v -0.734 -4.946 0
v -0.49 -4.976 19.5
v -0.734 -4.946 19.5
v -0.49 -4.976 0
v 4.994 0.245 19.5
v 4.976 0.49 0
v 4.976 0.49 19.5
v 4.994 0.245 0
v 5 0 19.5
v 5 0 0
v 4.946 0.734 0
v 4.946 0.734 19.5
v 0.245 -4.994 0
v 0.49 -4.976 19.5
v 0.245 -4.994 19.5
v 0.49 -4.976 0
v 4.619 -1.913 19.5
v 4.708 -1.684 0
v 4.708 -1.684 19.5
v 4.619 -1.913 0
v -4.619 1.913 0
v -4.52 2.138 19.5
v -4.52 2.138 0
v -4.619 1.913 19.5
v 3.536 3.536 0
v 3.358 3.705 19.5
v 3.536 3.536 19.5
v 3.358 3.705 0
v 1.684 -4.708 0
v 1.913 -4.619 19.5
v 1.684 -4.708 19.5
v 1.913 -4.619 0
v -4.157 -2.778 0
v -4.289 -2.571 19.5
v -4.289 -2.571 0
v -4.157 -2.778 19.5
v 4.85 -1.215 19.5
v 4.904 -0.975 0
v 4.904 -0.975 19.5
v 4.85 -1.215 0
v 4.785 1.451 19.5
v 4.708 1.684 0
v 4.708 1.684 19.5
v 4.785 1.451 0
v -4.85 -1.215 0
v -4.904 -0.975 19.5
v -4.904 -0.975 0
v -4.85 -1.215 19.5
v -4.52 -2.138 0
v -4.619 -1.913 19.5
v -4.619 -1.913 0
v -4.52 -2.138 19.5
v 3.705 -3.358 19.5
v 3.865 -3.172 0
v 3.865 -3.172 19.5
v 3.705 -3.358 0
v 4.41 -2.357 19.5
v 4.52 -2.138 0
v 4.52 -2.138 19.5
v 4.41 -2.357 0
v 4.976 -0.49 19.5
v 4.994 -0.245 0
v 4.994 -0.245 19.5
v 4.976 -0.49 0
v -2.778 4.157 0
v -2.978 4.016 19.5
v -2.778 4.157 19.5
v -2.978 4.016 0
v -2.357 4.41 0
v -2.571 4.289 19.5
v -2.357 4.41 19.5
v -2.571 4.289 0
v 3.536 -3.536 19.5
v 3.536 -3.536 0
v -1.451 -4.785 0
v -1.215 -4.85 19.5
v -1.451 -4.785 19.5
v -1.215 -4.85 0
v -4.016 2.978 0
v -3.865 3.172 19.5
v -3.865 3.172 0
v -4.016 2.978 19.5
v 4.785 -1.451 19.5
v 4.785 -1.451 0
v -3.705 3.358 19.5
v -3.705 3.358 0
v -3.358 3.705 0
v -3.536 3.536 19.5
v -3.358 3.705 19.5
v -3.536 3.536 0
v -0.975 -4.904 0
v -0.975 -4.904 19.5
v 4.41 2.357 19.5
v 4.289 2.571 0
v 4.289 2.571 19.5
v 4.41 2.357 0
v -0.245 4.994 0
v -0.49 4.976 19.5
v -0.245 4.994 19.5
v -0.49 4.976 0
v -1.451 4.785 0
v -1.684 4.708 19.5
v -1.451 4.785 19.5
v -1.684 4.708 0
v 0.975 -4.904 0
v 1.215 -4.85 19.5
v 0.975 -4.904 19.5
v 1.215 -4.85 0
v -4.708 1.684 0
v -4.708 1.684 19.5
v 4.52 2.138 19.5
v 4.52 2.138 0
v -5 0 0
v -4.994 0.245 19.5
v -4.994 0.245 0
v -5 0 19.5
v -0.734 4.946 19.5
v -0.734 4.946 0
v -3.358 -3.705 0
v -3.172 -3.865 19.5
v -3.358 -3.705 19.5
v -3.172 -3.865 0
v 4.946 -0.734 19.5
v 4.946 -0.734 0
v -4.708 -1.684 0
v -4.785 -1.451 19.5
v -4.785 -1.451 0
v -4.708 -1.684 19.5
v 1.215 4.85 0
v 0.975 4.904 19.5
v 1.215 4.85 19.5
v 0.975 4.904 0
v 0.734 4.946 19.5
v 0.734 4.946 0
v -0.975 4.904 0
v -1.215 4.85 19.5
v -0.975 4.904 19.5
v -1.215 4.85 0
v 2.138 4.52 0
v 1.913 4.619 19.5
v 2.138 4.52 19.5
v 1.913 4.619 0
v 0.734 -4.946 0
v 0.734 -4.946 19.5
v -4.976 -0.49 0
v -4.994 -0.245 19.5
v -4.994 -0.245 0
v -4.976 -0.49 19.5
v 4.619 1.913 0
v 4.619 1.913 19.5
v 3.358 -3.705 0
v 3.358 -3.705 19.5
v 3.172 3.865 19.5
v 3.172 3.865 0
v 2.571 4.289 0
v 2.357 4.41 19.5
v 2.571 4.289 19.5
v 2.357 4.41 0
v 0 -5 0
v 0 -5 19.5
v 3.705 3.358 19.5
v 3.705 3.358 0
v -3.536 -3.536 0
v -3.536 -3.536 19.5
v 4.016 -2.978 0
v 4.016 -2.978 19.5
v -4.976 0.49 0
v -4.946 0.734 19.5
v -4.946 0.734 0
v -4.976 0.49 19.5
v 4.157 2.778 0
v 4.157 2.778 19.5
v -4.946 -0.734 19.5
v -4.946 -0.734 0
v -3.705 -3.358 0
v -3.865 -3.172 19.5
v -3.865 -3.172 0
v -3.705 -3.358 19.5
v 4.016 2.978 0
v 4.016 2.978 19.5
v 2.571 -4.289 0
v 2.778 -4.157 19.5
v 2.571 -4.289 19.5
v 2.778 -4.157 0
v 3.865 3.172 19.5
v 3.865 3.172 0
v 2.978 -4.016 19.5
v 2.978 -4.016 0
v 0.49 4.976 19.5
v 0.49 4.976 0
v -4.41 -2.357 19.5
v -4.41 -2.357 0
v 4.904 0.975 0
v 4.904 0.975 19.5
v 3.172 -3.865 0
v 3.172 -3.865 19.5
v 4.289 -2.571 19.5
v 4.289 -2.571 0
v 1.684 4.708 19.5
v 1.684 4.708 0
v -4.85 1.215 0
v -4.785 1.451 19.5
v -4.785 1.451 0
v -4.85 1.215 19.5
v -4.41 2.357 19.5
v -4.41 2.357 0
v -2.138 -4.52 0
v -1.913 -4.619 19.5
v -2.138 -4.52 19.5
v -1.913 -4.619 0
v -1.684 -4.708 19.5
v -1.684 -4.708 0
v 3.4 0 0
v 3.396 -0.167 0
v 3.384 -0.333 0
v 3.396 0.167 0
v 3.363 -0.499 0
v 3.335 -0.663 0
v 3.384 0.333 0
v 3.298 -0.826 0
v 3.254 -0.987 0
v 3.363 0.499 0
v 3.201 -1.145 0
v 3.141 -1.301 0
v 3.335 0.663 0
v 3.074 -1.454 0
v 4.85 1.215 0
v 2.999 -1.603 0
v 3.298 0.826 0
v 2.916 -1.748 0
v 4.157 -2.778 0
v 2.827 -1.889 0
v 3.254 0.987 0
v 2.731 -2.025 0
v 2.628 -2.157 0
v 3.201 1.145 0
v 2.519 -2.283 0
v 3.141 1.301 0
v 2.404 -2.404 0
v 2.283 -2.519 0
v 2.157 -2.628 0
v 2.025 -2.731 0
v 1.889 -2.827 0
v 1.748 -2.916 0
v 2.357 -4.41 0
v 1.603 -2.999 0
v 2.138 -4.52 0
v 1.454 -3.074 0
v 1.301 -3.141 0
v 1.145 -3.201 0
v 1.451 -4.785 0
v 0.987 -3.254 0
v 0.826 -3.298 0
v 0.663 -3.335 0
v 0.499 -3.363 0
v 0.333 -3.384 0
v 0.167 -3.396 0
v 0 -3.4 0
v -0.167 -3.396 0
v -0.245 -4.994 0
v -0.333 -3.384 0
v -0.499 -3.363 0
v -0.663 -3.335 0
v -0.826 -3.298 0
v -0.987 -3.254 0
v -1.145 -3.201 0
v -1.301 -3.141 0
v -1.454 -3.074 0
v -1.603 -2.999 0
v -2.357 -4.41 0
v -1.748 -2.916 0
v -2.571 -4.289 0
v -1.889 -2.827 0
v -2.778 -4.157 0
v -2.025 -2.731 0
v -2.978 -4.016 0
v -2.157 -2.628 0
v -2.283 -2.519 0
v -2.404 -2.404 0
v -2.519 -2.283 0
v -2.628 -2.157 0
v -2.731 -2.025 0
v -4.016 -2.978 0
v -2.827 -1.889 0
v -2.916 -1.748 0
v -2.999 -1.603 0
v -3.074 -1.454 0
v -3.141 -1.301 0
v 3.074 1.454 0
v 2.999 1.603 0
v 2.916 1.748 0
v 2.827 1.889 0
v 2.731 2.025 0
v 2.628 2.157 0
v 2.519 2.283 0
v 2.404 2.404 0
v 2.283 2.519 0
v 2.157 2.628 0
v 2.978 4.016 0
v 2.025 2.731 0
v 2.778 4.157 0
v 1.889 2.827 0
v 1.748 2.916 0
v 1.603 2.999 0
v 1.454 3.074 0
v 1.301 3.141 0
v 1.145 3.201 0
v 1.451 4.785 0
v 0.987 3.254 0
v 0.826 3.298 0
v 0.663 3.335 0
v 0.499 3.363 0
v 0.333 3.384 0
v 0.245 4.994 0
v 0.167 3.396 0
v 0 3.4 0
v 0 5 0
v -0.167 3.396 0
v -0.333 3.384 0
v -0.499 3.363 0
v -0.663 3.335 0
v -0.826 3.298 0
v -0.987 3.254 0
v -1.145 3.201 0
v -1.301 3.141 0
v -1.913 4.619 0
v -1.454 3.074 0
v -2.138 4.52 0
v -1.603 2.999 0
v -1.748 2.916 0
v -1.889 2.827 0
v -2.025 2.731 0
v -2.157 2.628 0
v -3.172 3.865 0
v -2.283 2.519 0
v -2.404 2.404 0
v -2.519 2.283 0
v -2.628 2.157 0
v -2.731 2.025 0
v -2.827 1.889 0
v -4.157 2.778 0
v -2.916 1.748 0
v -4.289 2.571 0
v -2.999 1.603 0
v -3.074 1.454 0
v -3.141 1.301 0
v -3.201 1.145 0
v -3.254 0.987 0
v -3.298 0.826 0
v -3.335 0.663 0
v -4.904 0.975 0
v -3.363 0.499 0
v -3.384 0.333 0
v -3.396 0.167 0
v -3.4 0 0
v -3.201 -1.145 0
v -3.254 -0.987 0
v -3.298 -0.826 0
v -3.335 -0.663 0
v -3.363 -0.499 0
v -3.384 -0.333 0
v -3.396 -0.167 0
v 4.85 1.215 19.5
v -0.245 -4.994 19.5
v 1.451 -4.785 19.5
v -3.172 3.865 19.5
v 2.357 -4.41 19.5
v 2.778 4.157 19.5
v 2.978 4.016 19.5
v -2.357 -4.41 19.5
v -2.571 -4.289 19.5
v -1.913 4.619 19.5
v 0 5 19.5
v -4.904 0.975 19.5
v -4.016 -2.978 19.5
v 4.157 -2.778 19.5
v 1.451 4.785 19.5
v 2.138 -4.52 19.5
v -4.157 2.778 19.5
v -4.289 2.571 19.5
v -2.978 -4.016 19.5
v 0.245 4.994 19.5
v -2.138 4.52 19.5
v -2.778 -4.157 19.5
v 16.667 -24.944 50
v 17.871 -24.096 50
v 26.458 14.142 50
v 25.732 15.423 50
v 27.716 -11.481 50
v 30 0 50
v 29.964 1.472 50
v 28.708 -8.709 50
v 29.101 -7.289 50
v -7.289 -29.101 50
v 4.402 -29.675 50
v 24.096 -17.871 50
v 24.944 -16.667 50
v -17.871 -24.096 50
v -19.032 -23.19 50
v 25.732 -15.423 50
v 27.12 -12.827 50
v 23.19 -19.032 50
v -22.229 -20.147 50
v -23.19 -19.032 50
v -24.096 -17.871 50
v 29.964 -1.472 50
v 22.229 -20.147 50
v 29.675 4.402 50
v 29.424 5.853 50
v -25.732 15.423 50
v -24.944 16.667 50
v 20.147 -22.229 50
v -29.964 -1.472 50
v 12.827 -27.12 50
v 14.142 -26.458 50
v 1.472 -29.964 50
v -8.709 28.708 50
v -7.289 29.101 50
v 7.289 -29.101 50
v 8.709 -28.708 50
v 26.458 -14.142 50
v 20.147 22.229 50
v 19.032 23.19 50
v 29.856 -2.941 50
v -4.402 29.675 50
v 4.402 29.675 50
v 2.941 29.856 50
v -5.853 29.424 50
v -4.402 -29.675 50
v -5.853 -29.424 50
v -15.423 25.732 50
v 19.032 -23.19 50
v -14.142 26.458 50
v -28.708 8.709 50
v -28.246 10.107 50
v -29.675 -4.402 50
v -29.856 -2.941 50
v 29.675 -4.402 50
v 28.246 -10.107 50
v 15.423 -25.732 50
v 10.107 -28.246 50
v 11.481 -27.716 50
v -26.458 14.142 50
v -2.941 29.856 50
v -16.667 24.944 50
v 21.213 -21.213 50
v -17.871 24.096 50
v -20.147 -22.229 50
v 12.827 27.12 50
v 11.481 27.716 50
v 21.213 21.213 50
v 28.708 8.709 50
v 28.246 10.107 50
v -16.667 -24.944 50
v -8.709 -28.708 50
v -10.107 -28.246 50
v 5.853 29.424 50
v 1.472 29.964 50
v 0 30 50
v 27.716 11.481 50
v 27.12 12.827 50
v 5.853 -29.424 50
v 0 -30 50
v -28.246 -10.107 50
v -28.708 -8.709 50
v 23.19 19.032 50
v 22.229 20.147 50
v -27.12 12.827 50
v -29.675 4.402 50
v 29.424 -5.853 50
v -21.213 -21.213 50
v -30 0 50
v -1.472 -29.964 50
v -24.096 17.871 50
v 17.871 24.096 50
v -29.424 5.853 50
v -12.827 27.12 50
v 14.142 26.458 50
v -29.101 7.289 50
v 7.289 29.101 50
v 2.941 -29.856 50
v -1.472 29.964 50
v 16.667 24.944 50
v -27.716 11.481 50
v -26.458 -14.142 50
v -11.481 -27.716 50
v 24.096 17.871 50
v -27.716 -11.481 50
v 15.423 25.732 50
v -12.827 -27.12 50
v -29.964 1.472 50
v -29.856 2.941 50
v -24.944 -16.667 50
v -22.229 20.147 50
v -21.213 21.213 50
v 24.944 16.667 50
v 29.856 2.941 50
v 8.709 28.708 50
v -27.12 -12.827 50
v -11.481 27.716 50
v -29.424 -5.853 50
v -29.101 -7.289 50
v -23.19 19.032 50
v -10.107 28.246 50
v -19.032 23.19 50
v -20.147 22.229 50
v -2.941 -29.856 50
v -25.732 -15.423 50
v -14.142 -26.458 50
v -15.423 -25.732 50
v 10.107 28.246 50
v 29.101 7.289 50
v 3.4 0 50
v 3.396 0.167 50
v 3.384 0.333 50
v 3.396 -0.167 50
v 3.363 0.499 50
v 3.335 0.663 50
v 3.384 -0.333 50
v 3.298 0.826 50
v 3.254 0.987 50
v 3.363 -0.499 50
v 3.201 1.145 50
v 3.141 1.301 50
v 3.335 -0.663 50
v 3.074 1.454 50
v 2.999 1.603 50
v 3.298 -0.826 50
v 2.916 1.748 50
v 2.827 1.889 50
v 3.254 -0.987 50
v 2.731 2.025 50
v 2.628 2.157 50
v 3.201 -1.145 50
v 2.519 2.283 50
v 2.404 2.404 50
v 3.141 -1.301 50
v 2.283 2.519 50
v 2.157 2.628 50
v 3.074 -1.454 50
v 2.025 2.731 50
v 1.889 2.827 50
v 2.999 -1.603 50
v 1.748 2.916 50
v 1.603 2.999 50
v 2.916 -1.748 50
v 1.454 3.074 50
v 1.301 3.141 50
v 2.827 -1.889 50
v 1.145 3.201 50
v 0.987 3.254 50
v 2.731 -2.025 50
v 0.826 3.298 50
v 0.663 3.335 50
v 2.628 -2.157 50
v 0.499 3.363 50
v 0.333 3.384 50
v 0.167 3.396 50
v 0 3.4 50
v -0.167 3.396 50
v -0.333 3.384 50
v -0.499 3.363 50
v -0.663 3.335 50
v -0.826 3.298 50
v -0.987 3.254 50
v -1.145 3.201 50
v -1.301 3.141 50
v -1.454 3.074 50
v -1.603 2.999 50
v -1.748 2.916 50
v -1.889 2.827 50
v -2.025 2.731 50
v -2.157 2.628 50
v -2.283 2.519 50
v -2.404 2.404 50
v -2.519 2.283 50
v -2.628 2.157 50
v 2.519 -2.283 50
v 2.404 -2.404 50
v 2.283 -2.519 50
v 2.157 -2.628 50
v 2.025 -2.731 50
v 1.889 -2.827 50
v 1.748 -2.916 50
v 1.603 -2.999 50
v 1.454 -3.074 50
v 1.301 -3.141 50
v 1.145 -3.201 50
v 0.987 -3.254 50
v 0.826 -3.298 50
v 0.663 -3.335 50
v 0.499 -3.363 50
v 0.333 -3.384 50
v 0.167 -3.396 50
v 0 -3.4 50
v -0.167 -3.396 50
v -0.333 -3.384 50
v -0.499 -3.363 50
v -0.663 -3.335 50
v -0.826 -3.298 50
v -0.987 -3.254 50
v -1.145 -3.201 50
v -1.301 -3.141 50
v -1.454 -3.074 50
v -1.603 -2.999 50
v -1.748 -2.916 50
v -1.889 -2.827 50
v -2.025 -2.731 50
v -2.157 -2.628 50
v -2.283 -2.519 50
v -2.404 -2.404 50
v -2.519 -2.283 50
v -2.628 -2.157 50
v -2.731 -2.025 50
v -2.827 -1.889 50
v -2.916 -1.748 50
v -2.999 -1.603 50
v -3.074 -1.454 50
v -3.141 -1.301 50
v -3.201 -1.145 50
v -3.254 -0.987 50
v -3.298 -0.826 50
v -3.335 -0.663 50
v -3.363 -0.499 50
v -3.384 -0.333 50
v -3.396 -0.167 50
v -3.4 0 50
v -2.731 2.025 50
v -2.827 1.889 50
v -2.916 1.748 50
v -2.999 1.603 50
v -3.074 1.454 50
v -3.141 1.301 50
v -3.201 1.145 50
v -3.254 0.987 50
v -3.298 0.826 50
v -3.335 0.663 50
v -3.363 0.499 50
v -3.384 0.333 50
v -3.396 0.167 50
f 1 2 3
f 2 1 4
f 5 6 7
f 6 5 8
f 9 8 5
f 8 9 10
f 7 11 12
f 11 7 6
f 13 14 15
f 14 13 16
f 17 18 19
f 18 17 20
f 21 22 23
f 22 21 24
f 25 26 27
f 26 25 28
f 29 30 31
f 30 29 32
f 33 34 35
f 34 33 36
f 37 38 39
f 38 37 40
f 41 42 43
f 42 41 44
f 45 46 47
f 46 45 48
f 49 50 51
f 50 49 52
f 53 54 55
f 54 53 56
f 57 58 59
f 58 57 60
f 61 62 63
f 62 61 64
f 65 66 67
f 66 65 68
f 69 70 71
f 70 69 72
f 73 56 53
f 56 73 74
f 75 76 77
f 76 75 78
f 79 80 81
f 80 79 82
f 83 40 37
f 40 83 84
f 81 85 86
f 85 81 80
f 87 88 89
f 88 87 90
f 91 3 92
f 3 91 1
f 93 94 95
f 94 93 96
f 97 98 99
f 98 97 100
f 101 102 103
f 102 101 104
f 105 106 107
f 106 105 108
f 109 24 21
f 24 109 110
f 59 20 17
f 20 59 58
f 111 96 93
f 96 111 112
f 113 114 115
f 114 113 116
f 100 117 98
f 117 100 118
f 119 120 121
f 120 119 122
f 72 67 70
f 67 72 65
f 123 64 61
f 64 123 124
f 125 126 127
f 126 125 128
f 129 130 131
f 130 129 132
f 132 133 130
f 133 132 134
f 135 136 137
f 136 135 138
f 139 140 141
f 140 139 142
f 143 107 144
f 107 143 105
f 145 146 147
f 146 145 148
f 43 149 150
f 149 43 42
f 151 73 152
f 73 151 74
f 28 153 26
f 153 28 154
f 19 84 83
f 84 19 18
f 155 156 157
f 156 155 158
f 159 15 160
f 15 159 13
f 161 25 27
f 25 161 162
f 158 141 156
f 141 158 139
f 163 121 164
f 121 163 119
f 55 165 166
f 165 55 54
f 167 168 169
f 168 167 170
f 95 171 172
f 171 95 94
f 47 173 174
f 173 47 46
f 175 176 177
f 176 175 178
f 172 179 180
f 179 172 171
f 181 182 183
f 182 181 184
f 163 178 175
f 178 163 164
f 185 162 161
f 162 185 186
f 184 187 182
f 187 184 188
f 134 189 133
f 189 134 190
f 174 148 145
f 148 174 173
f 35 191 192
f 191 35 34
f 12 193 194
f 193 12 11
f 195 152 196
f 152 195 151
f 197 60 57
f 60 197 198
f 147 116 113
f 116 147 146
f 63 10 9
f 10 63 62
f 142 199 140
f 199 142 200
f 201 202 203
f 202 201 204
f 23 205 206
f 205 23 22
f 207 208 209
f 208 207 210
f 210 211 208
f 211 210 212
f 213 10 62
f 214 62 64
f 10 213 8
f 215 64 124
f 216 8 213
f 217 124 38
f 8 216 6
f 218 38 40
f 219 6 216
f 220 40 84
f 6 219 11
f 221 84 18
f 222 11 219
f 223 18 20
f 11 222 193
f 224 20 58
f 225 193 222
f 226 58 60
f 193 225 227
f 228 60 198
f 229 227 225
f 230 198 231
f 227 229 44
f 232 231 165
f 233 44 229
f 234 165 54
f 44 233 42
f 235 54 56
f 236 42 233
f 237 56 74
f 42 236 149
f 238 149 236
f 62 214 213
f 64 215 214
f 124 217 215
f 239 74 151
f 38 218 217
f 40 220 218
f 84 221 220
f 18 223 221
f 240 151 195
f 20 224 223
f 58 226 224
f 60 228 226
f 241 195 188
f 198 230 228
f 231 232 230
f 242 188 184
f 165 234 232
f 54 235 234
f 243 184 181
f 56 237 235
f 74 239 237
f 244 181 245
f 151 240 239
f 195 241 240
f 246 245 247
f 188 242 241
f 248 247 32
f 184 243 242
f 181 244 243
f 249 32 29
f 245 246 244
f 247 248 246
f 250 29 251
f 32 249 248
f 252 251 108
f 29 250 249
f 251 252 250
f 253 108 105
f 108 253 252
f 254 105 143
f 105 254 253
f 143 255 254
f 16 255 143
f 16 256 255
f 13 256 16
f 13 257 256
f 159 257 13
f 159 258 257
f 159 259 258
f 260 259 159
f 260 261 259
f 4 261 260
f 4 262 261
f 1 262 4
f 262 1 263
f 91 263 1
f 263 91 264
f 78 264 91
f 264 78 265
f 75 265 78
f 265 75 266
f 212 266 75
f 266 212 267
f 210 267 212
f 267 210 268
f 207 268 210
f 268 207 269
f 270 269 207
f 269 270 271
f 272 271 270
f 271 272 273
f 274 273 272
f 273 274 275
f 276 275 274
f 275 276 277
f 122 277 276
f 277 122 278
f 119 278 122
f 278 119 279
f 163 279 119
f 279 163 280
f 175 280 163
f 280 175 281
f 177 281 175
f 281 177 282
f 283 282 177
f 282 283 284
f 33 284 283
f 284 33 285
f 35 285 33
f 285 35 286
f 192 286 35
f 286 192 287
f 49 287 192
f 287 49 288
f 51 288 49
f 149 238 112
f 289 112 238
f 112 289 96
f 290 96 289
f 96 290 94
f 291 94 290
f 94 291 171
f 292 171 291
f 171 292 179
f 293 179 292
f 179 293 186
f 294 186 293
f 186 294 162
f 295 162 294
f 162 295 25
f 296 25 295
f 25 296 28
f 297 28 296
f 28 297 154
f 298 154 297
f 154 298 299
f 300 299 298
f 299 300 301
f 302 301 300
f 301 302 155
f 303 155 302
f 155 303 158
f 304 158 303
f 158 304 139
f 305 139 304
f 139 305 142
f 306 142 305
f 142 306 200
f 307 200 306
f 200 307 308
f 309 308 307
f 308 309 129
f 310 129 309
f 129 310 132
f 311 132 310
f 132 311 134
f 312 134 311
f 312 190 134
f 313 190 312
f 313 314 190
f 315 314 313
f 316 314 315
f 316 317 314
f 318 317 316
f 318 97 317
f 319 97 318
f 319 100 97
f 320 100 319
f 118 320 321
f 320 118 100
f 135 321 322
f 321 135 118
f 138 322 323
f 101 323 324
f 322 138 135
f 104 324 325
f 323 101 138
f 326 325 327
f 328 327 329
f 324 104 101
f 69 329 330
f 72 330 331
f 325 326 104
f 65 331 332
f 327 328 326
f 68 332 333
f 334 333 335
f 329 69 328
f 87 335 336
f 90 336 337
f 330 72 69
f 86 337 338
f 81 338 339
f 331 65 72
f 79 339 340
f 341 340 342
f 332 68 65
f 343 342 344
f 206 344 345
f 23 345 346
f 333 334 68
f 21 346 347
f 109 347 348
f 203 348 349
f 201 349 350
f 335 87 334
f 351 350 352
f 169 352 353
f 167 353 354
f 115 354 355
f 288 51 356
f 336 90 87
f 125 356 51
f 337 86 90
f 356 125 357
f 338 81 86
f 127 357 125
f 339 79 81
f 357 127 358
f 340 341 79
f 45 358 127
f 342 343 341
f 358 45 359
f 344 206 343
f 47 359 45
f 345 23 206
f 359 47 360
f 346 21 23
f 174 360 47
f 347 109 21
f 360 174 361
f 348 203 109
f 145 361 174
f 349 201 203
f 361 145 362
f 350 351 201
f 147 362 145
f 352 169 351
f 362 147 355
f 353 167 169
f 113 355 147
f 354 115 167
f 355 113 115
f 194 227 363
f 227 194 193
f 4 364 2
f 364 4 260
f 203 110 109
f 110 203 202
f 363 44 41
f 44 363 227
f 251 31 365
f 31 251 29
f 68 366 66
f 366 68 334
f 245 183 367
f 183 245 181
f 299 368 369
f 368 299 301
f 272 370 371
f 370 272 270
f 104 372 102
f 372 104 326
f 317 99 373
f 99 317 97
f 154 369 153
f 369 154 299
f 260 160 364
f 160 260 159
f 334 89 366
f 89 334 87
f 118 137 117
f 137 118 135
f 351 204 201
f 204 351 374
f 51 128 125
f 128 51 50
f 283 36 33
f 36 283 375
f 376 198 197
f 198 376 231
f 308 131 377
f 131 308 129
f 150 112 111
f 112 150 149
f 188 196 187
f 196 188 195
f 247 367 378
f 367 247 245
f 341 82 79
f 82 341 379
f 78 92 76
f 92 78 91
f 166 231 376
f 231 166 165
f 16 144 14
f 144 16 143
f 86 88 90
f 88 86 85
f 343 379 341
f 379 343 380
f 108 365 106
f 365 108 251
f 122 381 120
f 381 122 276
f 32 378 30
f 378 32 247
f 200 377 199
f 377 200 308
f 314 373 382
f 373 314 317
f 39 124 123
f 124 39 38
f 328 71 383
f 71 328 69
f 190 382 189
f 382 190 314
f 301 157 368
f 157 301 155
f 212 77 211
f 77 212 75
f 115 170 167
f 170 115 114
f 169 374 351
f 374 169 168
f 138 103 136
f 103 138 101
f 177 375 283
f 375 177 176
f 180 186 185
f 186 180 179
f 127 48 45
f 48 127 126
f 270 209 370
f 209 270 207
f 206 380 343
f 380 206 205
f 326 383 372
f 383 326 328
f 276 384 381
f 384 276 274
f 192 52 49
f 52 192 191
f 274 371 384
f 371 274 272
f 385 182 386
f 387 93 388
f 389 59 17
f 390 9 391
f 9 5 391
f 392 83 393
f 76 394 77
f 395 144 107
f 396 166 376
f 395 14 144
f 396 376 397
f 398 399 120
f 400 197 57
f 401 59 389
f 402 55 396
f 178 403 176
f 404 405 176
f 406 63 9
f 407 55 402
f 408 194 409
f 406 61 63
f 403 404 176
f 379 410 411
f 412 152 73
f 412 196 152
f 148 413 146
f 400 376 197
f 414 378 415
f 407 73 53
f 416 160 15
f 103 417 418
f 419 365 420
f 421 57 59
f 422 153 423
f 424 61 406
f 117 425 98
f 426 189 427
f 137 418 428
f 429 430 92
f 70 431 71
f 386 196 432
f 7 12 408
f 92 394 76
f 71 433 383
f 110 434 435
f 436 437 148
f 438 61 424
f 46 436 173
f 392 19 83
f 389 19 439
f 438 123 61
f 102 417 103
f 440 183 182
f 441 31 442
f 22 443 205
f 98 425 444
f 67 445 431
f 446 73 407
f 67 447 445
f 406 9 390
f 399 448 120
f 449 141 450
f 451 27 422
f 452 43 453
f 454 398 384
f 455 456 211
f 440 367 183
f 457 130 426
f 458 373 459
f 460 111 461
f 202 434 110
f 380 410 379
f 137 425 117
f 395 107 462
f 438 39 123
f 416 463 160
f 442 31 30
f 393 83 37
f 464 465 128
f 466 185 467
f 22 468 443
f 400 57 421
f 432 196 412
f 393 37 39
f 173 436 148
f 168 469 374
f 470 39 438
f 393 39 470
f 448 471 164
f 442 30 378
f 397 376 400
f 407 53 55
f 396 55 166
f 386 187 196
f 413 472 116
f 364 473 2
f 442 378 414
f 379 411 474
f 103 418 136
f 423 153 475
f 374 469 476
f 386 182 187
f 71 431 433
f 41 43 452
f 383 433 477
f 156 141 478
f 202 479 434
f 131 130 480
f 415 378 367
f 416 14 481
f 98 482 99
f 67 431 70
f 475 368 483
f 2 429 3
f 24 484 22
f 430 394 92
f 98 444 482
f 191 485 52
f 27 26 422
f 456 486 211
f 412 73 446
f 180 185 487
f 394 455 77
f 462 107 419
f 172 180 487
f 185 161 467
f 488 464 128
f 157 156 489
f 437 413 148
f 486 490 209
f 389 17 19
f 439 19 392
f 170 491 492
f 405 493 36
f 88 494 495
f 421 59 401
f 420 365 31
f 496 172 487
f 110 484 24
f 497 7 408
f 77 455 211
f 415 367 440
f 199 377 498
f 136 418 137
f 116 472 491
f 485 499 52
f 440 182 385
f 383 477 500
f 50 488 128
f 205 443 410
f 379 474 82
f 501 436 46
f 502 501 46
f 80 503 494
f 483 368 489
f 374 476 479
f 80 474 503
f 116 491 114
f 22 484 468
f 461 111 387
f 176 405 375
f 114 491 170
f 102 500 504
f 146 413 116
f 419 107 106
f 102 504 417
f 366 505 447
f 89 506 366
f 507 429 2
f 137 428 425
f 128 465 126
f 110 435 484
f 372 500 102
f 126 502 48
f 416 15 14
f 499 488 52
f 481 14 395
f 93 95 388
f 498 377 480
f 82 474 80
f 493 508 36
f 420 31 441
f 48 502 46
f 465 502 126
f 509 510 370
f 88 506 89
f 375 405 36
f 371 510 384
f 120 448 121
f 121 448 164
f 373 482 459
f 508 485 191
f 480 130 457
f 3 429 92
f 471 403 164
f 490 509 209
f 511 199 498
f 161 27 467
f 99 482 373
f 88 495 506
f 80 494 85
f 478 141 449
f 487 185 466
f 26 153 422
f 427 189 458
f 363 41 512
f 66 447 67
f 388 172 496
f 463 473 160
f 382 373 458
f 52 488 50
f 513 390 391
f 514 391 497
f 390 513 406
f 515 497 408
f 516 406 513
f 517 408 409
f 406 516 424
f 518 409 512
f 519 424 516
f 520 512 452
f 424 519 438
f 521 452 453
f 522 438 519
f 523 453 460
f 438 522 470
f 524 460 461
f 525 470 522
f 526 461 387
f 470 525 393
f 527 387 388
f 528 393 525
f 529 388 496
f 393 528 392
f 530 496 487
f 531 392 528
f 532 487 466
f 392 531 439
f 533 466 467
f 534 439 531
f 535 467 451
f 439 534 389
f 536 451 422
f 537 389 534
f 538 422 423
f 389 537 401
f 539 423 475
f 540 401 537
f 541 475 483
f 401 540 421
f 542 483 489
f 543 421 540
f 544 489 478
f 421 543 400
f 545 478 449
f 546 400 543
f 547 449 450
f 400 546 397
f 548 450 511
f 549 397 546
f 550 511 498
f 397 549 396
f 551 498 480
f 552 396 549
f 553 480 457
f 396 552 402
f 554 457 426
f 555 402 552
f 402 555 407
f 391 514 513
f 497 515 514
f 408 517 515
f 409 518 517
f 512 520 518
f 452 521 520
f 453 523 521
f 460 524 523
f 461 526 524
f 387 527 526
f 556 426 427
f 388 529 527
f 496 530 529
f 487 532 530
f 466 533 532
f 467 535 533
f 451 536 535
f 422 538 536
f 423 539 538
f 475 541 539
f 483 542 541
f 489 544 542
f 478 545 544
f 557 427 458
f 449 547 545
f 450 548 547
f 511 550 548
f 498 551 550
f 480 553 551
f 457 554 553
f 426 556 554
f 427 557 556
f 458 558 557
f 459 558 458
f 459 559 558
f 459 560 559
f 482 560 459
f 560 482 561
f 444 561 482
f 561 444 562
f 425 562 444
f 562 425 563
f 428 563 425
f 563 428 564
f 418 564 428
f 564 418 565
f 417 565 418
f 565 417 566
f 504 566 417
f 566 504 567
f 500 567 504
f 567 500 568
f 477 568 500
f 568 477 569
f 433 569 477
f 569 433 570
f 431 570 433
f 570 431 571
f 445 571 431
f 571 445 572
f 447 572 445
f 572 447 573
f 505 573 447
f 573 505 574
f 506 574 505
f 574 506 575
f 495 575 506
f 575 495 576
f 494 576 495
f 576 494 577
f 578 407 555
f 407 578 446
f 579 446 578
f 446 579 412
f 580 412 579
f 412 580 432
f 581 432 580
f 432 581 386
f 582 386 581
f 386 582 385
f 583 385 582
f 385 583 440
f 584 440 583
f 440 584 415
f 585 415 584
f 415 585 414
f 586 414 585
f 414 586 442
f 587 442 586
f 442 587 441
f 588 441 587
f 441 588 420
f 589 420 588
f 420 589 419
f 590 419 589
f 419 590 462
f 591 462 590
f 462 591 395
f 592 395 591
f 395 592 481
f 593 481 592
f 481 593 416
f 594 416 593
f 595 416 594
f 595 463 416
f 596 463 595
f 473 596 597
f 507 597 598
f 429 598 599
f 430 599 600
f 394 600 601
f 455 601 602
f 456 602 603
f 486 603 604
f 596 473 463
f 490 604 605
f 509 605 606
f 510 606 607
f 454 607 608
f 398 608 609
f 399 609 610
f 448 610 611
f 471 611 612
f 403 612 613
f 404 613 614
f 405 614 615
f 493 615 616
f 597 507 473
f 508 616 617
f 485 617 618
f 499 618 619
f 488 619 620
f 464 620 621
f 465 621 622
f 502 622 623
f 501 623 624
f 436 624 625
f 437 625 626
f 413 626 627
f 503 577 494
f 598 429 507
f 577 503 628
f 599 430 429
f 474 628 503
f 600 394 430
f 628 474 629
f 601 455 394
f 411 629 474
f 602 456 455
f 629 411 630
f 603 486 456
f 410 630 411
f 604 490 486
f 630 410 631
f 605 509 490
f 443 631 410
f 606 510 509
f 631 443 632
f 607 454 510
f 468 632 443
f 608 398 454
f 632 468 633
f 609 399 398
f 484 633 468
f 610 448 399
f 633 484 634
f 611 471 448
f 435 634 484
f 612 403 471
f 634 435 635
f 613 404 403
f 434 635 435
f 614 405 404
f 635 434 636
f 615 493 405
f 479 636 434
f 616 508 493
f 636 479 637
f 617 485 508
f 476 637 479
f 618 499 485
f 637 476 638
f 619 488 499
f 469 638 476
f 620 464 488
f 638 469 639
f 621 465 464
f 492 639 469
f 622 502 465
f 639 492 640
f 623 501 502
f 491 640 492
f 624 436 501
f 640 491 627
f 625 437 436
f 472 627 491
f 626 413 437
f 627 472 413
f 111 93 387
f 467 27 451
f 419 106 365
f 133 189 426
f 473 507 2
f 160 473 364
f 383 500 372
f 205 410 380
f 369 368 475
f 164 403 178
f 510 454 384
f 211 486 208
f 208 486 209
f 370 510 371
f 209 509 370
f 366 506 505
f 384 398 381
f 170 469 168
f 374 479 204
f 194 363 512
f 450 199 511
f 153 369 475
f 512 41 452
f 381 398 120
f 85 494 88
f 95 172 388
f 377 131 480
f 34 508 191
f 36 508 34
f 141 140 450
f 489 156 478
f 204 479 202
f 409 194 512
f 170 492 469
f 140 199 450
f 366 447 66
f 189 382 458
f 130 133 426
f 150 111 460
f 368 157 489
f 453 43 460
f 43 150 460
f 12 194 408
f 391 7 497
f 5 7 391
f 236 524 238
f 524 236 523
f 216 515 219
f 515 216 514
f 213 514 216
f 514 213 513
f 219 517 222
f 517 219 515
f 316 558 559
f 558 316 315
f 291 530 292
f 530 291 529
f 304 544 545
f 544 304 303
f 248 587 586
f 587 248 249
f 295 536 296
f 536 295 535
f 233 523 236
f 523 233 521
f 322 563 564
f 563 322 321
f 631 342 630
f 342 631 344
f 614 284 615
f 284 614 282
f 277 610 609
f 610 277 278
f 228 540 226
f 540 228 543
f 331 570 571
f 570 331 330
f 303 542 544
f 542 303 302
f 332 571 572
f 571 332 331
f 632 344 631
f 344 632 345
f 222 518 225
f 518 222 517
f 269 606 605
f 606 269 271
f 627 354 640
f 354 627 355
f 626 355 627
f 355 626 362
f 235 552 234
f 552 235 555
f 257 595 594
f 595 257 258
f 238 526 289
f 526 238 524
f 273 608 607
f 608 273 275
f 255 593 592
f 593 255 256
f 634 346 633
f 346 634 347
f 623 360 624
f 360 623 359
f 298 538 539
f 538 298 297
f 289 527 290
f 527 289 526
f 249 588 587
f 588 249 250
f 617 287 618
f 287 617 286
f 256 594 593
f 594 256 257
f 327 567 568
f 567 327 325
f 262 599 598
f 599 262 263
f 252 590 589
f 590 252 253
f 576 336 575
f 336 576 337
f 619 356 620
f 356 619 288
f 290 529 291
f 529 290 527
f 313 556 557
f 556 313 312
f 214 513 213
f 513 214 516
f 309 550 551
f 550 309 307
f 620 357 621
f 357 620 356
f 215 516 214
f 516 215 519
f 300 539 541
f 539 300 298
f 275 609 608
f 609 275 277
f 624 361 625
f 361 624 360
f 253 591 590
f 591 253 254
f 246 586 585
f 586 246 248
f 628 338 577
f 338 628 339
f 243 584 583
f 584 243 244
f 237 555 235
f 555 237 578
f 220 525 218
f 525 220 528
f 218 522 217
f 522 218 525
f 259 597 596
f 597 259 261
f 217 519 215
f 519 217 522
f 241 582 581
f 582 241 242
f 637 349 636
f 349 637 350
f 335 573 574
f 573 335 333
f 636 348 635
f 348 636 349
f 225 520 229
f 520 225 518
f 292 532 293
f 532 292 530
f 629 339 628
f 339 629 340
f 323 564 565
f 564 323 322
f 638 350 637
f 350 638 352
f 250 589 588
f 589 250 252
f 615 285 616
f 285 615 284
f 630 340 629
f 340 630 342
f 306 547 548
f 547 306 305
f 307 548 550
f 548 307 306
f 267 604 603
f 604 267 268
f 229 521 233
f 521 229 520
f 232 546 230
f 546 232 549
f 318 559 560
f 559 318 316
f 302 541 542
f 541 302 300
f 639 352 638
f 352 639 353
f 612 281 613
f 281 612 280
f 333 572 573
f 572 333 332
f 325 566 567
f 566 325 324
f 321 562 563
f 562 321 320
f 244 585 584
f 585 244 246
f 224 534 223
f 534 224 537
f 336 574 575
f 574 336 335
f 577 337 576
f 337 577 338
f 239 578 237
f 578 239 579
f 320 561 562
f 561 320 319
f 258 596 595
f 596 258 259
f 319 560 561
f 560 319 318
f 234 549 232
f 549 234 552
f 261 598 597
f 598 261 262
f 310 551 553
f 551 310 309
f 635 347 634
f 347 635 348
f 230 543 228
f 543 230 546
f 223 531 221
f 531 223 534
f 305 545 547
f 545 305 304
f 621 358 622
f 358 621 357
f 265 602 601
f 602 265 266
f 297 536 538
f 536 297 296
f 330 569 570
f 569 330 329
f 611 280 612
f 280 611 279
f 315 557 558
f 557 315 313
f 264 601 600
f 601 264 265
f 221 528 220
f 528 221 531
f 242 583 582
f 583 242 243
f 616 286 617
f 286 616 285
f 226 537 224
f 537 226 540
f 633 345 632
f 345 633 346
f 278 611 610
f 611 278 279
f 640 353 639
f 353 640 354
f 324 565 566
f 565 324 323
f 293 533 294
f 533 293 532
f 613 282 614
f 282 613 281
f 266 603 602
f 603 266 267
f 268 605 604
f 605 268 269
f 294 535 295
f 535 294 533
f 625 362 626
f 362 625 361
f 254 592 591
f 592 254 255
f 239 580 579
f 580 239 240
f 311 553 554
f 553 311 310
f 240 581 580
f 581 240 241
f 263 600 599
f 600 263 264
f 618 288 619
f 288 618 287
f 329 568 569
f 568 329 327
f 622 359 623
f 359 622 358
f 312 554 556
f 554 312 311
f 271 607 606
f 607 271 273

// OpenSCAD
// Lab funnel - printed upright with wide opening at top
// Straight spout from z = 0 to z = 20, cone from z = 20 to z = 50

// ---- Dimensions (mm) ----
spout_od      = 10;    // spout outer diameter
spout_h       = 20;    // spout height (z = 0 to 20)
cone_od_top   = 60;    // cone outer diameter at rim (z = 50)
cone_od_base  = 10;    // cone outer diameter at z = 20
total_h       = 50;    // funnel top rim height
wall          = 1.6;   // wall thickness everywhere

eps           = 0.5;   // overlap for clean boolean cuts
$fn           = 128;   // curve resolution

// ---- Derived ----
bore = spout_od - 2 * wall;   // 6.8 mm bore in spout

// ---- Model ----
difference() {
    union() {
        // Spout
        cylinder(h = spout_h, d = spout_od);
        // Cone (slightly extended into spout to fuse solids)
        translate([0, 0, spout_h - eps])
            cylinder(h = total_h - spout_h + eps, d1 = cone_od_base, d2 = cone_od_top);
    }
    // Through-bore along Z
    translate([0, 0, -eps])
        cylinder(h = total_h + 2 * eps, d = bore);
}
